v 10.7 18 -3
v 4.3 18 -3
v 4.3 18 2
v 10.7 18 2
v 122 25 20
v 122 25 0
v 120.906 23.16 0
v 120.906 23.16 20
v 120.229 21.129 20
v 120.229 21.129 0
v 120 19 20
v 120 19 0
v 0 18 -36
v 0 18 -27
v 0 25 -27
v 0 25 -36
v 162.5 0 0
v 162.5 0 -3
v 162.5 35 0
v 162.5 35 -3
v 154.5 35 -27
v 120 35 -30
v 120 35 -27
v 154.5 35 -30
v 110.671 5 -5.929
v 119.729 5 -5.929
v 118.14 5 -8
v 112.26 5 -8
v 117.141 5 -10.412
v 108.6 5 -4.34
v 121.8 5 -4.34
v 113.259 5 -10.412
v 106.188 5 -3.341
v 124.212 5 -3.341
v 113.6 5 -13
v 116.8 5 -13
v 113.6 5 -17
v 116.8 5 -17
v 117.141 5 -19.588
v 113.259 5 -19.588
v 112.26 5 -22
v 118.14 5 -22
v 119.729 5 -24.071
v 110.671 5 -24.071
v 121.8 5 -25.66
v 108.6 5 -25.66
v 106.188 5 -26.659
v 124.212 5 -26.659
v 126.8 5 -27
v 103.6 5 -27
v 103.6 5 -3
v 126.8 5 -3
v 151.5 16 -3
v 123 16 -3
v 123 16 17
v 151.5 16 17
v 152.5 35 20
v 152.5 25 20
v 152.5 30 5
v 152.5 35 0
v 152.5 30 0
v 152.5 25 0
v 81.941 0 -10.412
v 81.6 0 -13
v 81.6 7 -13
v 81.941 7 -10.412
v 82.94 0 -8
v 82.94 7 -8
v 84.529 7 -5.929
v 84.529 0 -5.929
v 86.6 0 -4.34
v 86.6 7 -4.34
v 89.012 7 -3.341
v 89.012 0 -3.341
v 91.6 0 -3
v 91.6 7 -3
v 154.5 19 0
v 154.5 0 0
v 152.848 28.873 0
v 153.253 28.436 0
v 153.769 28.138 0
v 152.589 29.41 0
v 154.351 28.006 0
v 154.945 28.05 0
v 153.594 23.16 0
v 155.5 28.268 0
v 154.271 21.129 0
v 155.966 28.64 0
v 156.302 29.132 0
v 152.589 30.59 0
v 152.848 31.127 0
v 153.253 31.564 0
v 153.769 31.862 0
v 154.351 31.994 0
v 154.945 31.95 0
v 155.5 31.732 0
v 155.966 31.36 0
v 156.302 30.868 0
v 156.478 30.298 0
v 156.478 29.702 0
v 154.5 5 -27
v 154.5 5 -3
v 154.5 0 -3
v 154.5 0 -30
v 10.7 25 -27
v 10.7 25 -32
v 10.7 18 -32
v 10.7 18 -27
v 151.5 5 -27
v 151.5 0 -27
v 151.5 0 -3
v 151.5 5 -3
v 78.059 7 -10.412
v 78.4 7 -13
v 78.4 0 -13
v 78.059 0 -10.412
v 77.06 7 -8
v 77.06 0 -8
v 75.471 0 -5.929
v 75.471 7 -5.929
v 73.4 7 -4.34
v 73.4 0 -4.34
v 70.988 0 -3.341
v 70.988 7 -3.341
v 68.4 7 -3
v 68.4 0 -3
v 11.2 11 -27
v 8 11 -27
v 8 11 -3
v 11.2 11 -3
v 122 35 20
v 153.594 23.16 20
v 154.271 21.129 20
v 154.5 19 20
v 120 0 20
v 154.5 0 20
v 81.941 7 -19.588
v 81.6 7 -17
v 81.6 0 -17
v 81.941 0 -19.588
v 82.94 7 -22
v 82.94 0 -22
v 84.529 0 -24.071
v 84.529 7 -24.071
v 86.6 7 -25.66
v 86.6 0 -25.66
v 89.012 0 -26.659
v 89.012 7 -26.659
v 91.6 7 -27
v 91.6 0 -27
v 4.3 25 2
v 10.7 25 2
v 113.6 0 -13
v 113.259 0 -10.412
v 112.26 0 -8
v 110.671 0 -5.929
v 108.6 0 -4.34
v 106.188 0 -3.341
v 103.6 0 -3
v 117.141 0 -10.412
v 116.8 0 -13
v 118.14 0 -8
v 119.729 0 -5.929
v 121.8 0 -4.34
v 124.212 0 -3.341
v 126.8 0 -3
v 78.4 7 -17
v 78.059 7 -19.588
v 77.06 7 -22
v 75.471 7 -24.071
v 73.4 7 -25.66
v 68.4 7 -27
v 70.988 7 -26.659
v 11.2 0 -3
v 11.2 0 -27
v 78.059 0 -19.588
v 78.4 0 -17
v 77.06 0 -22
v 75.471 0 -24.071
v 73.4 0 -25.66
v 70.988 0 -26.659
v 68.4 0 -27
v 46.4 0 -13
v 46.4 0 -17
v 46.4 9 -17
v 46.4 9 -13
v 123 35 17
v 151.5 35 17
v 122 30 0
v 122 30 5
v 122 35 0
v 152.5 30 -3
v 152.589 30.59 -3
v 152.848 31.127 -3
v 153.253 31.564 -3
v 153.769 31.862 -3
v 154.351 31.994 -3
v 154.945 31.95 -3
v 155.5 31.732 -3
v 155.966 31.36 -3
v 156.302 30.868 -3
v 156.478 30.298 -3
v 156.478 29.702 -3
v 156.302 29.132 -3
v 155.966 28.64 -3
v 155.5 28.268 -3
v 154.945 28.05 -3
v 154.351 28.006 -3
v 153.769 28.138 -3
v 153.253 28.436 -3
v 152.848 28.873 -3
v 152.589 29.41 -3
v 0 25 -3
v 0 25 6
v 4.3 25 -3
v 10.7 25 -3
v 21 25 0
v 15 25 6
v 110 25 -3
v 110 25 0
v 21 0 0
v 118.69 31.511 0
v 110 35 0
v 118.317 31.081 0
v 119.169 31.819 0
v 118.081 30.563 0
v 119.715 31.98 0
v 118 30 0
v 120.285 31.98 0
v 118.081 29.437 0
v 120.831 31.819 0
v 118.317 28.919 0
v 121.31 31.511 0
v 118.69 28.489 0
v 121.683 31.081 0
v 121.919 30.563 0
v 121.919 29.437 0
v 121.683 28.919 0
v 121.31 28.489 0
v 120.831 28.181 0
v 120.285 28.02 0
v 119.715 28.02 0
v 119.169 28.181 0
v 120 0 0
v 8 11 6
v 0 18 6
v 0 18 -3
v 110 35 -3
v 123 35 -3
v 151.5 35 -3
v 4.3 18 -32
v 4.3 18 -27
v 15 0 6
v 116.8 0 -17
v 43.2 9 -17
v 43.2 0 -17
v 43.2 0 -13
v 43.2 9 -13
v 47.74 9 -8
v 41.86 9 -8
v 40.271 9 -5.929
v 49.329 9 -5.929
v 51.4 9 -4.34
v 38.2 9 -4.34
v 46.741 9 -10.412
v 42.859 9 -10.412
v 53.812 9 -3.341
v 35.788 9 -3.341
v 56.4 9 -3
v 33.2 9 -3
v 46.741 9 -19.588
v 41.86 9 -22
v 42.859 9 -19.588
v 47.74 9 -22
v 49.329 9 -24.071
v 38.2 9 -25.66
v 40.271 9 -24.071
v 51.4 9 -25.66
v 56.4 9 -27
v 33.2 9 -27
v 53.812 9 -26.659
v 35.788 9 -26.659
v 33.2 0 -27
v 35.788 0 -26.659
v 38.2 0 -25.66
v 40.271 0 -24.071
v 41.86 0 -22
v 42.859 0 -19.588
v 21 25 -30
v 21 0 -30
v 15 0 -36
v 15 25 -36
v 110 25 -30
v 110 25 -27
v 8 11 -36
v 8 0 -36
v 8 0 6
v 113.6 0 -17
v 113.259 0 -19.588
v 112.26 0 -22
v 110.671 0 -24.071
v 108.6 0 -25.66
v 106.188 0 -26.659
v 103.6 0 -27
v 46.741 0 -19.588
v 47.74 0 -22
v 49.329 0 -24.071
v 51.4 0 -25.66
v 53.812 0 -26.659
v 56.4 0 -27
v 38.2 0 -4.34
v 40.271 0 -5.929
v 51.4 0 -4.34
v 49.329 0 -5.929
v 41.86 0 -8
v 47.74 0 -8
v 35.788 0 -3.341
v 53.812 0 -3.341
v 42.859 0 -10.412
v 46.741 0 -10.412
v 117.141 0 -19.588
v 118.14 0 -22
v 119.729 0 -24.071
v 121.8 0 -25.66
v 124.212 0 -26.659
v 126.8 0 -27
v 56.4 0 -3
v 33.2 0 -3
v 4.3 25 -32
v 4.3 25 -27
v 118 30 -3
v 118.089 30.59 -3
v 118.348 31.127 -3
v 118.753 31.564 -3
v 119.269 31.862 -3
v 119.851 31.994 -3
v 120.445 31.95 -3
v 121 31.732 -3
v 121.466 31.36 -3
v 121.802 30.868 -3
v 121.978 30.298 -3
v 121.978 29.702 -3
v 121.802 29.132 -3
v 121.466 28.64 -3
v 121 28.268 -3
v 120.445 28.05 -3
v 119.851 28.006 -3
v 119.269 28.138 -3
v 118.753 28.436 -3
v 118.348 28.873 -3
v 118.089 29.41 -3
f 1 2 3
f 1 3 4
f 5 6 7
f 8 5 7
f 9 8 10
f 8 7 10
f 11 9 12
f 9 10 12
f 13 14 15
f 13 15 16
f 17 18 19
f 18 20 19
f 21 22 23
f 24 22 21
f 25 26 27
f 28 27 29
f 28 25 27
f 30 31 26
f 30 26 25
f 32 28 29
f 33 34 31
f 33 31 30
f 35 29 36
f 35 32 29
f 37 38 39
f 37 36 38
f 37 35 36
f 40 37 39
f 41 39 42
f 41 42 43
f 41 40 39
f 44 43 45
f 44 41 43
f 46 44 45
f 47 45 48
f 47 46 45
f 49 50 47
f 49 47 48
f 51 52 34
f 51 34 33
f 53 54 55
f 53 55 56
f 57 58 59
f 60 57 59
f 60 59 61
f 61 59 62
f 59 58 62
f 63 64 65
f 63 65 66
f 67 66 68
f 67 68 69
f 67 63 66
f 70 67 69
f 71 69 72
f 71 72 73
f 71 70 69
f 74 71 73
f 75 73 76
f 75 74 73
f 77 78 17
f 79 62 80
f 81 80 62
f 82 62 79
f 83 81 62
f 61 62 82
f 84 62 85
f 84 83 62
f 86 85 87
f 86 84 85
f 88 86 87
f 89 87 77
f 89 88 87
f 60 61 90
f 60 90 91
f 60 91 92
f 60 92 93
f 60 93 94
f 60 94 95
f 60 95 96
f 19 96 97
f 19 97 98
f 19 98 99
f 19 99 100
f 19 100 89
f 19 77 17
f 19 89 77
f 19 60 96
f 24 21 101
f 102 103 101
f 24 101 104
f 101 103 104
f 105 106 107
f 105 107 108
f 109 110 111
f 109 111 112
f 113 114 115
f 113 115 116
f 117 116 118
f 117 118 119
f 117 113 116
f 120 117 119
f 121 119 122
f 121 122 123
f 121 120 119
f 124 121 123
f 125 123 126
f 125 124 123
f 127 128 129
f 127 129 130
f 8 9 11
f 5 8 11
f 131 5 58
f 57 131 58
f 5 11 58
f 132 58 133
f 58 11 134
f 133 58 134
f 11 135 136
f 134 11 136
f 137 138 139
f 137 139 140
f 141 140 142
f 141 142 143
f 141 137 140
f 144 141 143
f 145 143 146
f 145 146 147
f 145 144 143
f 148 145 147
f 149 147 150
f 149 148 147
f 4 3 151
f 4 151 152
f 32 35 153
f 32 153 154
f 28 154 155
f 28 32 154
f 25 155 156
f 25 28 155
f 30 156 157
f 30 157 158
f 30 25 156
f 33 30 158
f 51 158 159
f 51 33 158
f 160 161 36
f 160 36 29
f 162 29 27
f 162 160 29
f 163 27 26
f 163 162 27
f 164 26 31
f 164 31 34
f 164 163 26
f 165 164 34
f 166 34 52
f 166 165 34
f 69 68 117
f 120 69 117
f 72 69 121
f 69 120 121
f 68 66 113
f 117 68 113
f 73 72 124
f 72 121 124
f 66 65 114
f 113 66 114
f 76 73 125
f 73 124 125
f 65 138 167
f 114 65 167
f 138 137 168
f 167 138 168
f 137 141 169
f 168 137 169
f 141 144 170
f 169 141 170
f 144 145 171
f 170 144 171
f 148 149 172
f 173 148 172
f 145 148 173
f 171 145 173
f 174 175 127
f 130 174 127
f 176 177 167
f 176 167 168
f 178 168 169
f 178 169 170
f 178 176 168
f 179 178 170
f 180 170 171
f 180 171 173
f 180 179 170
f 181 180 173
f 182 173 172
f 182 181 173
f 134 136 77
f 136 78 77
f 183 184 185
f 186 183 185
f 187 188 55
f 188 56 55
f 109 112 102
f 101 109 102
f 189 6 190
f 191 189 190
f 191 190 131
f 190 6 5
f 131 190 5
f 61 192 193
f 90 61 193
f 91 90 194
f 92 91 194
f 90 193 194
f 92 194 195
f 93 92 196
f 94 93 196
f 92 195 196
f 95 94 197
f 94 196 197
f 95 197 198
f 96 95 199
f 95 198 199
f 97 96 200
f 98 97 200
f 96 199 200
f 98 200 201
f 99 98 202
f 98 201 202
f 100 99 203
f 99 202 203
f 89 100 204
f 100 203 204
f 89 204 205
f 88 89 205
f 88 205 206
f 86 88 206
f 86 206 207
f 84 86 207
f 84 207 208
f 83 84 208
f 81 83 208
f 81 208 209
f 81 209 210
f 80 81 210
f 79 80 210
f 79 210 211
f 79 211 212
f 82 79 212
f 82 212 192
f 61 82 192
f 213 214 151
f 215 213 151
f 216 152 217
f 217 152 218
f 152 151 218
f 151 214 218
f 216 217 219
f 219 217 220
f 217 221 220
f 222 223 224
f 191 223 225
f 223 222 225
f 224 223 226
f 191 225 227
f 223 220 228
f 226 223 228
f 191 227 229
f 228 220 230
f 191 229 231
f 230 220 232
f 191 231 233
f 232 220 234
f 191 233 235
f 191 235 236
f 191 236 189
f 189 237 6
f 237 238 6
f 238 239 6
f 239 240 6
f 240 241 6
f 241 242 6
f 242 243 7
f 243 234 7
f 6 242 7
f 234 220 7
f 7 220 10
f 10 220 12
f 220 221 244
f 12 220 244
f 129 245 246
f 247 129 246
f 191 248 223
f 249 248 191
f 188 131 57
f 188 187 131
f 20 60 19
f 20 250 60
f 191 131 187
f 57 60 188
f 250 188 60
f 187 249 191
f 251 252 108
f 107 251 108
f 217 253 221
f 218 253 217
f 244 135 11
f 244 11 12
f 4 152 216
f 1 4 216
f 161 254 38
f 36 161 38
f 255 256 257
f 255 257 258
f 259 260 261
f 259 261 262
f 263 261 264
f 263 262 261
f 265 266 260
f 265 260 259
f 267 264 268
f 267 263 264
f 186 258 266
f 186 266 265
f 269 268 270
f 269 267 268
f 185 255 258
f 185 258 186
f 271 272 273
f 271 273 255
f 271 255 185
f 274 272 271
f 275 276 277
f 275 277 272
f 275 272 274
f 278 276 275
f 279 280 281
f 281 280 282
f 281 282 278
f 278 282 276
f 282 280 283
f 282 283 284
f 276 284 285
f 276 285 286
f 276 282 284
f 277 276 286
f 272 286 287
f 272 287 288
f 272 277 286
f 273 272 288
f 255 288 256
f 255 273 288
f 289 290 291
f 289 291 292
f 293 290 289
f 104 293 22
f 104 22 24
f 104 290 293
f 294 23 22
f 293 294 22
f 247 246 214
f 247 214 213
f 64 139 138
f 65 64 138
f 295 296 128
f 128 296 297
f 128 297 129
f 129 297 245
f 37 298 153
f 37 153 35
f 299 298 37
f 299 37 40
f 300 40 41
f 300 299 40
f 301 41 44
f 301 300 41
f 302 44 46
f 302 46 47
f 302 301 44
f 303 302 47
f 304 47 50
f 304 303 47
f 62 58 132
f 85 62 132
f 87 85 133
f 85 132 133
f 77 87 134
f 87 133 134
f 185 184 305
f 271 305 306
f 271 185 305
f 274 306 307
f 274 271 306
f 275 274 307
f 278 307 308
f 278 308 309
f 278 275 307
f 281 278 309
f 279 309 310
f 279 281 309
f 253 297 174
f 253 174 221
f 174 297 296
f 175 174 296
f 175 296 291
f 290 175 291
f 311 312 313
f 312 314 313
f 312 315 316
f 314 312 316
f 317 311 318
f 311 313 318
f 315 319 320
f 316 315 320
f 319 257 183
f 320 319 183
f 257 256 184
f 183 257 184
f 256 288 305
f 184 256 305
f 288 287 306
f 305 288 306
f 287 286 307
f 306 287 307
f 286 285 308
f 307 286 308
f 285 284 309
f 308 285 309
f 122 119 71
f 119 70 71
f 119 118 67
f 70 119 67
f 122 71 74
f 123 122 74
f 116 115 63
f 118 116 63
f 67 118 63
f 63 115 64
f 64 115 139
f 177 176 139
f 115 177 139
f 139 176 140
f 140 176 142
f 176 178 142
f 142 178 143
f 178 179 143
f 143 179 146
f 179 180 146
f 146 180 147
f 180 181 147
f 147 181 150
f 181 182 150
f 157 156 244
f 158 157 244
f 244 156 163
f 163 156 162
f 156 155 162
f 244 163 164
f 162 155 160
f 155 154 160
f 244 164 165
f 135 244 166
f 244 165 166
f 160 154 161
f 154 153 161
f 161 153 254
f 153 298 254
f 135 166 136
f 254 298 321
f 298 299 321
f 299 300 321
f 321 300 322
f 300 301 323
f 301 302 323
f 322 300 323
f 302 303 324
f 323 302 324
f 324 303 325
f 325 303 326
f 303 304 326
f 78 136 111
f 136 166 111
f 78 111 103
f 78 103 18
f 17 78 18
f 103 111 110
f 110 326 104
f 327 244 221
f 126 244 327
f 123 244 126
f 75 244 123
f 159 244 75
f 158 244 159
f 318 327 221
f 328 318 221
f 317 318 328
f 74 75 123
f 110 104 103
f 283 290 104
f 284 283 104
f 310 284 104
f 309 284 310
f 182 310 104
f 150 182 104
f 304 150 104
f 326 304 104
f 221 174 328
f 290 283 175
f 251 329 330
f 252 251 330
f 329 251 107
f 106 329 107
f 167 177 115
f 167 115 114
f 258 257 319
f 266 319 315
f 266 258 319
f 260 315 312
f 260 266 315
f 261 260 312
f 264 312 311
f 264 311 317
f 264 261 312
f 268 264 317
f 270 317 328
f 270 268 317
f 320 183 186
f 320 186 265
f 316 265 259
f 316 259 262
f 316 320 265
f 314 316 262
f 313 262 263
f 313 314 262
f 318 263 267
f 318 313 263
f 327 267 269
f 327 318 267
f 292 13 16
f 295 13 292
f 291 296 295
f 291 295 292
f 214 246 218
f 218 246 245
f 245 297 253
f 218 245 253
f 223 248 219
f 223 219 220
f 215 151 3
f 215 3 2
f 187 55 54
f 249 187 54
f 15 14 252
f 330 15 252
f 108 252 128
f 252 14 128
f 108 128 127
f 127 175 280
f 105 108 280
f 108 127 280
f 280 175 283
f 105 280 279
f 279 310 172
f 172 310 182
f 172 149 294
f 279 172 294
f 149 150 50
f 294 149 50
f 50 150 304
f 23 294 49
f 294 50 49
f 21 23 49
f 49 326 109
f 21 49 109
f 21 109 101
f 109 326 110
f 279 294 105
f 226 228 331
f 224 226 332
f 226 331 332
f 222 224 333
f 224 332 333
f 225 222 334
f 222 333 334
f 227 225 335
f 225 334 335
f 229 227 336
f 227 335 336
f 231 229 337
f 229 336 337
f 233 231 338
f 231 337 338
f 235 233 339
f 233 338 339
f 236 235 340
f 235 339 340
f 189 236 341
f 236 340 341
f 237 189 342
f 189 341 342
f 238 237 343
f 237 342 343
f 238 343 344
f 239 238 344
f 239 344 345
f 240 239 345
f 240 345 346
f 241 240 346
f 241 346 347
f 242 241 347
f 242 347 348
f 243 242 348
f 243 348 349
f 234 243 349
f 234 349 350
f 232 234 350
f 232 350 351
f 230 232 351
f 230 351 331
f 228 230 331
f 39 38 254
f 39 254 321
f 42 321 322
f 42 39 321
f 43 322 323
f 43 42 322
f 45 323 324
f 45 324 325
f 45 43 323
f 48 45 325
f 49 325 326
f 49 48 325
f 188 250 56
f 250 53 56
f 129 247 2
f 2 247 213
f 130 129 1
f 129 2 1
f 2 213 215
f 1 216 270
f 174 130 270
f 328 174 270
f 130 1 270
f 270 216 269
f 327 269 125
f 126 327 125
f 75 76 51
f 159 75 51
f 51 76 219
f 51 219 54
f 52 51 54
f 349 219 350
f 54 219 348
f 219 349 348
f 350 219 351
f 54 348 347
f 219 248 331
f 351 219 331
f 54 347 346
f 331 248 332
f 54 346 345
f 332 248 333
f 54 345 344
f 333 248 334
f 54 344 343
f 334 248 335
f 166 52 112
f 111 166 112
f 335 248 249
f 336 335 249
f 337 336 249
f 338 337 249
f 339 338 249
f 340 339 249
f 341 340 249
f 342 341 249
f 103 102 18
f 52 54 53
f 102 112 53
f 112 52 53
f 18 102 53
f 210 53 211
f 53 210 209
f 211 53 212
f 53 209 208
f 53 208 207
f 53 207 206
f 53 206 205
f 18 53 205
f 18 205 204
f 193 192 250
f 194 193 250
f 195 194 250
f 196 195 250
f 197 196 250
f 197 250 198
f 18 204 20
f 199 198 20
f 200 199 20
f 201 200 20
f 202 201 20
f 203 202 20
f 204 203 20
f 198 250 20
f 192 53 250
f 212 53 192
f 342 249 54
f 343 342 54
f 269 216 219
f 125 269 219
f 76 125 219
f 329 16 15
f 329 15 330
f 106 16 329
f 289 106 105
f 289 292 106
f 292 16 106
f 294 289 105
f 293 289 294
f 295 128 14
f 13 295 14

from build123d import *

# Parameters (mm, degrees)
SKETCH1_W               = 154.5
SKETCH1_H               = 30
SKETCH1_W_2             = 34.5
SKETCH1_H_2             = 20
BOSS_EXTRUDE2_DEPTH     = 1
BOSS_EXTRUDE5_DEPTH     = 24
SKETCH5_W               = 3.2
SKETCH5_H               = 10
SKETCH5_H_2             = 8
SKETCH5_H_3             = 6
SKETCH5_H_4             = 4
SKETCH5_W_2             = 3
BOSS_EXTRUDE6_DEPTH     = 24
SKETCH6_W               = 28.5
SKETCH6_H               = 20
BOSS_EXTRUDE7_DEPTH     = 15
BOSS_EXTRUDE8_DEPTH     = 10
SKETCH9_W               = 8
SKETCH9_H               = 3
BOSS_EXTRUDE9_DEPTH     = 25
SKETCH10_R              = 2
CUT_EXTRUDE1_DEPTH      = 8
SKETCH11_W              = 32
SKETCH11_H              = 24
SKETCH11_W_2            = 34.7
CUT_EXTRUDE2_DEPTH      = 8
FILLET1_R               = 10
SKETCH13_W              = 15
SKETCH13_H              = 6
BOSS_EXTRUDE10_DEPTH    = 25
SKETCH15_W              = 6.4
SKETCH15_H              = 5
CUT_EXTRUDE3_DEPTH      = 7
CUT_EXTRUDE4_DEPTH      = 170.470498908
CUT_EXTRUDE4_DEPTH_BACK = 170.470498908
CHAMFER1_SIZE           = 6
SKETCH17_W              = 34.5
SKETCH17_H              = 3
BOSS_EXTRUDE11_DEPTH    = 10
CHAMFER2_SIZE           = 10


# Some blends are built 0.0001 mm under size
with BuildPart() as part:
    # Sketch1 → Boss-Extrude2 (new body)
    with BuildSketch(Plane(origin=(0, 0, 0), x_dir=(1, 0, 0), z_dir=(0, 1, 0))):
        with Locations((77.25, 15)):
            Rectangle(SKETCH1_W, SKETCH1_H)
        with Locations((137.25, -10)):
            Rectangle(SKETCH1_W_2, SKETCH1_H_2)
    extrude(amount=BOSS_EXTRUDE2_DEPTH)

    # Sketch2 → Boss-Extrude5 (add)
    with BuildSketch(Plane(origin=(0, 1, 0), x_dir=(1, 0, 0), z_dir=(0, 1, 0))):
        Polygon((3, 27), (0, 27), (0, 30), (154.5, 30), (154.5, 27), (151.5, 27), align=None)
        Polygon((0, 0), (120, 0), (120, -20), (154.5, -20), (154.5, 3), (151.5, 3), (151.5, -17), (123, -17), (123, 3), (3, 3), (0, 3), align=None)
    extrude(amount=BOSS_EXTRUDE5_DEPTH)

    # Sketch5 → Boss-Extrude6 (add)
    with BuildSketch(Plane.XY.offset(-27)):
        with Locations((9.6, 6)):
            Rectangle(SKETCH5_W, SKETCH5_H)
        with Locations((44.8, 5)):
            Rectangle(SKETCH5_W, SKETCH5_H_2)
        with Locations((80, 4)):
            Rectangle(SKETCH5_W, SKETCH5_H_3)
        with Locations((115.2, 3)):
            Rectangle(SKETCH5_W, SKETCH5_H_4)
        with Locations((153, 3)):
            Rectangle(SKETCH5_W_2, SKETCH5_H_4)
    extrude(amount=BOSS_EXTRUDE6_DEPTH)

    # Sketch6 → Boss-Extrude7 (add)
    with BuildSketch(Plane(origin=(0, 1, 0), x_dir=(1, 0, 0), z_dir=(0, 1, 0))):
        with Locations((137.25, -7)):
            Rectangle(SKETCH6_W, SKETCH6_H)
    extrude(amount=BOSS_EXTRUDE7_DEPTH)

    # Sketch7 → Boss-Extrude8 (add)
    with BuildSketch(Plane(origin=(0, 25, 0), x_dir=(1, 0, 0), z_dir=(0, 1, 0))):
        Polygon((110, 3), (110, 0), (122, 0), (122, -20), (152.5, -20), (152.5, 0), (162.5, 0), (162.5, 3), (151.5, 3), (151.5, -17), (123, -17), (123, 3), align=None)
    extrude(amount=BOSS_EXTRUDE8_DEPTH)

    # Sketch9 → Boss-Extrude9 (add)
    with BuildSketch(Plane.XZ.offset(-25)):
        with Locations((158.5, -1.5)):
            Rectangle(SKETCH9_W, SKETCH9_H)
    extrude(amount=BOSS_EXTRUDE9_DEPTH)

    # Sketch10 → Cut-Extrude1 (cut)
    with BuildSketch(Plane(origin=(0, 0, -3), x_dir=(-1, 0, 0), z_dir=(0, 0, -1))):
        with Locations((-120, 30)):
            Circle(SKETCH10_R)
        with Locations((-154.5, 30)):
            Circle(SKETCH10_R)
    extrude(amount=-CUT_EXTRUDE1_DEPTH, mode=Mode.SUBTRACT)

    # Sketch11 → Cut-Extrude2 (cut)
    with BuildSketch(Plane(origin=(0, 1, 0), x_dir=(1, 0, 0), z_dir=(0, 1, 0))):
        with Locations((27.2, 15)):
            Rectangle(SKETCH11_W, SKETCH11_H)
        with Locations((62.4, 15)):
            Rectangle(SKETCH11_W, SKETCH11_H)
        with Locations((97.6, 15)):
            Rectangle(SKETCH11_W, SKETCH11_H)
        with Locations((134.15, 15)):
            Rectangle(SKETCH11_W_2, SKETCH11_H)
    extrude(amount=-CUT_EXTRUDE2_DEPTH, mode=Mode.SUBTRACT)

    # Fillet1
    # the kernel refuses this fillet: 10 mm, written as the material it adds along each edge
    with BuildSketch(Plane(origin=(46.4, 0, -3), x_dir=(1, 0, 0), z_dir=(0, 1, 0)), Plane(origin=(43.2, 9, -3), x_dir=(-1, 0, 0), z_dir=(0, -1, 0)), Plane(origin=(46.4, 9, -27), x_dir=(1, 0, 0), z_dir=(0, -1, 0))) as fillet1_piece_1:
        with BuildLine():
            CenterArc((FILLET1_R, FILLET1_R), FILLET1_R, 180, 90)
            Line((0, FILLET1_R), (0, 0))
            Line((0, 0), (FILLET1_R, 0))
        make_face()
    extrude(amount=9)
    with BuildSketch(Plane(origin=(81.6, 0, -3), x_dir=(1, 0, 0), z_dir=(0, 1, 0)), Plane(origin=(78.4, 0, -27), x_dir=(-1, 0, 0), z_dir=(0, 1, 0)), Plane(origin=(78.4, 7, -3), x_dir=(-1, 0, 0), z_dir=(0, -1, 0)), Plane(origin=(81.6, 7, -27), x_dir=(1, 0, 0), z_dir=(0, -1, 0))) as fillet1_piece_2:
        with BuildLine():
            CenterArc((FILLET1_R, FILLET1_R), FILLET1_R, 180, 90)
            Line((0, FILLET1_R), (0, 0))
            Line((0, 0), (FILLET1_R, 0))
        make_face()
    extrude(amount=7)
    with BuildSketch(Plane(origin=(116.8, 0, -3), x_dir=(1, 0, 0), z_dir=(0, 1, 0)), Plane(origin=(113.6, 0, -27), x_dir=(-1, 0, 0), z_dir=(0, 1, 0)), Plane(origin=(113.6, 5, -3), x_dir=(-1, 0, 0), z_dir=(0, -1, 0))) as fillet1_piece_3:
        with BuildLine():
            CenterArc((FILLET1_R, FILLET1_R), FILLET1_R, 180, 90)
            Line((0, FILLET1_R), (0, 0))
            Line((0, 0), (FILLET1_R, 0))
        make_face()
    extrude(amount=5)
    with BuildSketch(Plane(origin=(43.2, 9, -27), x_dir=(-1, 0, 0), z_dir=(0, -1, 0))) as fillet1_piece_4:
        with BuildLine():
            CenterArc((FILLET1_R, -FILLET1_R), FILLET1_R, 90, 90)
            Line((0, -FILLET1_R), (0, 0))
            Line((0, 0), (FILLET1_R, 0))
        make_face()
    extrude(amount=9)
    with BuildSketch(Plane(origin=(116.8, 5, -27), x_dir=(0, 0, 1), z_dir=(0, -1, 0))) as fillet1_piece_5:
        with BuildLine():
            CenterArc((FILLET1_R, -FILLET1_R), FILLET1_R, 90, 90)
            Line((0, -FILLET1_R), (0, 0))
            Line((0, 0), (FILLET1_R, 0))
        make_face()
    extrude(amount=5)
    # the kernel refuses this fillet: 10 mm, written as the material it takes off along each edge
    with BuildSketch(Plane(origin=(154.5, 25, 35), x_dir=(0, -1, 0), z_dir=(0, 0, -1))) as fillet1_2_piece_1:
        with BuildLine():
            CenterArc((6, 10), FILLET1_R, 233.130102354, 36.869897646)
            Line((0, 2), (0, 0))
            Line((0, 0), (6, 0))
        make_face()
    extrude(amount=35, mode=Mode.SUBTRACT)
    with BuildSketch(Plane(origin=(120, 25, 0), x_dir=(1, 0, 0), z_dir=(0, 0, 1))) as fillet1_2_piece_2:
        with BuildLine():
            CenterArc((10, -6), FILLET1_R, 143.130102354, 36.869897646)
            Line((0, -6), (0, 0))
            Line((0, 0), (2, 0))
        make_face()
    extrude(amount=35, mode=Mode.SUBTRACT)

    # Sketch13 → Boss-Extrude10 (add)
    with BuildSketch(Plane.XZ):
        with Locations((7.5, 3)):
            Rectangle(SKETCH13_W, SKETCH13_H)
    boss_extrude10 = extrude(amount=-BOSS_EXTRUDE10_DEPTH)

    # Sketch15 → Cut-Extrude3 (cut)
    with BuildSketch(Plane(origin=(0, 25, 0), x_dir=(1, 0, 0), z_dir=(0, 1, 0))):
        with Locations((7.5, 0.5)):
            Rectangle(SKETCH15_W, SKETCH15_H)
    cut_extrude3 = extrude(amount=-CUT_EXTRUDE3_DEPTH, mode=Mode.SUBTRACT)

    # Mirror1: Boss-Extrude10, Cut-Extrude3 across plane
    add(boss_extrude10.mirror(Plane.XY.offset(-15)))
    add(cut_extrude3.mirror(Plane.XY.offset(-15)), mode=Mode.SUBTRACT)

    # Sketch16 → Cut-Extrude4 (cut, two sides: drawn at the far end of the back side and taken through both)
    with BuildSketch(Plane(origin=(0, 0, -3), x_dir=(-1, 0, 0), z_dir=(0, 0, -1)).offset(-CUT_EXTRUDE4_DEPTH_BACK)):
        Polygon((-8, 11), (0, 18), (0, 0), (-8, 0), align=None)
    extrude(amount=CUT_EXTRUDE4_DEPTH + CUT_EXTRUDE4_DEPTH_BACK, mode=Mode.SUBTRACT)

    # Chamfer1
    chamfer1_edges = [part.edges().sort_by_distance(p)[0] for p in [
        (15, 12.5, -30),
        (15, 12.5, 0),
    ]]
    chamfer(chamfer1_edges, length=CHAMFER1_SIZE - 0.0001)  # a hair under: the kernel refuses the full size

    # Sketch17 → Boss-Extrude11 (add)
    with BuildSketch(Plane(origin=(0, 25, 0), x_dir=(1, 0, 0), z_dir=(0, 1, 0))):
        with Locations((137.25, 28.5)):
            Rectangle(SKETCH17_W, SKETCH17_H)
    extrude(amount=BOSS_EXTRUDE11_DEPTH)

    # Chamfer2
    chamfer2_edges = [part.edges().sort_by_distance(p)[0] for p in [
        (120, 25, -28.5),
    ]]
    chamfer(chamfer2_edges, length=CHAMFER2_SIZE - 0.0001)  # a hair under: the kernel refuses the full size


solid = part.part
